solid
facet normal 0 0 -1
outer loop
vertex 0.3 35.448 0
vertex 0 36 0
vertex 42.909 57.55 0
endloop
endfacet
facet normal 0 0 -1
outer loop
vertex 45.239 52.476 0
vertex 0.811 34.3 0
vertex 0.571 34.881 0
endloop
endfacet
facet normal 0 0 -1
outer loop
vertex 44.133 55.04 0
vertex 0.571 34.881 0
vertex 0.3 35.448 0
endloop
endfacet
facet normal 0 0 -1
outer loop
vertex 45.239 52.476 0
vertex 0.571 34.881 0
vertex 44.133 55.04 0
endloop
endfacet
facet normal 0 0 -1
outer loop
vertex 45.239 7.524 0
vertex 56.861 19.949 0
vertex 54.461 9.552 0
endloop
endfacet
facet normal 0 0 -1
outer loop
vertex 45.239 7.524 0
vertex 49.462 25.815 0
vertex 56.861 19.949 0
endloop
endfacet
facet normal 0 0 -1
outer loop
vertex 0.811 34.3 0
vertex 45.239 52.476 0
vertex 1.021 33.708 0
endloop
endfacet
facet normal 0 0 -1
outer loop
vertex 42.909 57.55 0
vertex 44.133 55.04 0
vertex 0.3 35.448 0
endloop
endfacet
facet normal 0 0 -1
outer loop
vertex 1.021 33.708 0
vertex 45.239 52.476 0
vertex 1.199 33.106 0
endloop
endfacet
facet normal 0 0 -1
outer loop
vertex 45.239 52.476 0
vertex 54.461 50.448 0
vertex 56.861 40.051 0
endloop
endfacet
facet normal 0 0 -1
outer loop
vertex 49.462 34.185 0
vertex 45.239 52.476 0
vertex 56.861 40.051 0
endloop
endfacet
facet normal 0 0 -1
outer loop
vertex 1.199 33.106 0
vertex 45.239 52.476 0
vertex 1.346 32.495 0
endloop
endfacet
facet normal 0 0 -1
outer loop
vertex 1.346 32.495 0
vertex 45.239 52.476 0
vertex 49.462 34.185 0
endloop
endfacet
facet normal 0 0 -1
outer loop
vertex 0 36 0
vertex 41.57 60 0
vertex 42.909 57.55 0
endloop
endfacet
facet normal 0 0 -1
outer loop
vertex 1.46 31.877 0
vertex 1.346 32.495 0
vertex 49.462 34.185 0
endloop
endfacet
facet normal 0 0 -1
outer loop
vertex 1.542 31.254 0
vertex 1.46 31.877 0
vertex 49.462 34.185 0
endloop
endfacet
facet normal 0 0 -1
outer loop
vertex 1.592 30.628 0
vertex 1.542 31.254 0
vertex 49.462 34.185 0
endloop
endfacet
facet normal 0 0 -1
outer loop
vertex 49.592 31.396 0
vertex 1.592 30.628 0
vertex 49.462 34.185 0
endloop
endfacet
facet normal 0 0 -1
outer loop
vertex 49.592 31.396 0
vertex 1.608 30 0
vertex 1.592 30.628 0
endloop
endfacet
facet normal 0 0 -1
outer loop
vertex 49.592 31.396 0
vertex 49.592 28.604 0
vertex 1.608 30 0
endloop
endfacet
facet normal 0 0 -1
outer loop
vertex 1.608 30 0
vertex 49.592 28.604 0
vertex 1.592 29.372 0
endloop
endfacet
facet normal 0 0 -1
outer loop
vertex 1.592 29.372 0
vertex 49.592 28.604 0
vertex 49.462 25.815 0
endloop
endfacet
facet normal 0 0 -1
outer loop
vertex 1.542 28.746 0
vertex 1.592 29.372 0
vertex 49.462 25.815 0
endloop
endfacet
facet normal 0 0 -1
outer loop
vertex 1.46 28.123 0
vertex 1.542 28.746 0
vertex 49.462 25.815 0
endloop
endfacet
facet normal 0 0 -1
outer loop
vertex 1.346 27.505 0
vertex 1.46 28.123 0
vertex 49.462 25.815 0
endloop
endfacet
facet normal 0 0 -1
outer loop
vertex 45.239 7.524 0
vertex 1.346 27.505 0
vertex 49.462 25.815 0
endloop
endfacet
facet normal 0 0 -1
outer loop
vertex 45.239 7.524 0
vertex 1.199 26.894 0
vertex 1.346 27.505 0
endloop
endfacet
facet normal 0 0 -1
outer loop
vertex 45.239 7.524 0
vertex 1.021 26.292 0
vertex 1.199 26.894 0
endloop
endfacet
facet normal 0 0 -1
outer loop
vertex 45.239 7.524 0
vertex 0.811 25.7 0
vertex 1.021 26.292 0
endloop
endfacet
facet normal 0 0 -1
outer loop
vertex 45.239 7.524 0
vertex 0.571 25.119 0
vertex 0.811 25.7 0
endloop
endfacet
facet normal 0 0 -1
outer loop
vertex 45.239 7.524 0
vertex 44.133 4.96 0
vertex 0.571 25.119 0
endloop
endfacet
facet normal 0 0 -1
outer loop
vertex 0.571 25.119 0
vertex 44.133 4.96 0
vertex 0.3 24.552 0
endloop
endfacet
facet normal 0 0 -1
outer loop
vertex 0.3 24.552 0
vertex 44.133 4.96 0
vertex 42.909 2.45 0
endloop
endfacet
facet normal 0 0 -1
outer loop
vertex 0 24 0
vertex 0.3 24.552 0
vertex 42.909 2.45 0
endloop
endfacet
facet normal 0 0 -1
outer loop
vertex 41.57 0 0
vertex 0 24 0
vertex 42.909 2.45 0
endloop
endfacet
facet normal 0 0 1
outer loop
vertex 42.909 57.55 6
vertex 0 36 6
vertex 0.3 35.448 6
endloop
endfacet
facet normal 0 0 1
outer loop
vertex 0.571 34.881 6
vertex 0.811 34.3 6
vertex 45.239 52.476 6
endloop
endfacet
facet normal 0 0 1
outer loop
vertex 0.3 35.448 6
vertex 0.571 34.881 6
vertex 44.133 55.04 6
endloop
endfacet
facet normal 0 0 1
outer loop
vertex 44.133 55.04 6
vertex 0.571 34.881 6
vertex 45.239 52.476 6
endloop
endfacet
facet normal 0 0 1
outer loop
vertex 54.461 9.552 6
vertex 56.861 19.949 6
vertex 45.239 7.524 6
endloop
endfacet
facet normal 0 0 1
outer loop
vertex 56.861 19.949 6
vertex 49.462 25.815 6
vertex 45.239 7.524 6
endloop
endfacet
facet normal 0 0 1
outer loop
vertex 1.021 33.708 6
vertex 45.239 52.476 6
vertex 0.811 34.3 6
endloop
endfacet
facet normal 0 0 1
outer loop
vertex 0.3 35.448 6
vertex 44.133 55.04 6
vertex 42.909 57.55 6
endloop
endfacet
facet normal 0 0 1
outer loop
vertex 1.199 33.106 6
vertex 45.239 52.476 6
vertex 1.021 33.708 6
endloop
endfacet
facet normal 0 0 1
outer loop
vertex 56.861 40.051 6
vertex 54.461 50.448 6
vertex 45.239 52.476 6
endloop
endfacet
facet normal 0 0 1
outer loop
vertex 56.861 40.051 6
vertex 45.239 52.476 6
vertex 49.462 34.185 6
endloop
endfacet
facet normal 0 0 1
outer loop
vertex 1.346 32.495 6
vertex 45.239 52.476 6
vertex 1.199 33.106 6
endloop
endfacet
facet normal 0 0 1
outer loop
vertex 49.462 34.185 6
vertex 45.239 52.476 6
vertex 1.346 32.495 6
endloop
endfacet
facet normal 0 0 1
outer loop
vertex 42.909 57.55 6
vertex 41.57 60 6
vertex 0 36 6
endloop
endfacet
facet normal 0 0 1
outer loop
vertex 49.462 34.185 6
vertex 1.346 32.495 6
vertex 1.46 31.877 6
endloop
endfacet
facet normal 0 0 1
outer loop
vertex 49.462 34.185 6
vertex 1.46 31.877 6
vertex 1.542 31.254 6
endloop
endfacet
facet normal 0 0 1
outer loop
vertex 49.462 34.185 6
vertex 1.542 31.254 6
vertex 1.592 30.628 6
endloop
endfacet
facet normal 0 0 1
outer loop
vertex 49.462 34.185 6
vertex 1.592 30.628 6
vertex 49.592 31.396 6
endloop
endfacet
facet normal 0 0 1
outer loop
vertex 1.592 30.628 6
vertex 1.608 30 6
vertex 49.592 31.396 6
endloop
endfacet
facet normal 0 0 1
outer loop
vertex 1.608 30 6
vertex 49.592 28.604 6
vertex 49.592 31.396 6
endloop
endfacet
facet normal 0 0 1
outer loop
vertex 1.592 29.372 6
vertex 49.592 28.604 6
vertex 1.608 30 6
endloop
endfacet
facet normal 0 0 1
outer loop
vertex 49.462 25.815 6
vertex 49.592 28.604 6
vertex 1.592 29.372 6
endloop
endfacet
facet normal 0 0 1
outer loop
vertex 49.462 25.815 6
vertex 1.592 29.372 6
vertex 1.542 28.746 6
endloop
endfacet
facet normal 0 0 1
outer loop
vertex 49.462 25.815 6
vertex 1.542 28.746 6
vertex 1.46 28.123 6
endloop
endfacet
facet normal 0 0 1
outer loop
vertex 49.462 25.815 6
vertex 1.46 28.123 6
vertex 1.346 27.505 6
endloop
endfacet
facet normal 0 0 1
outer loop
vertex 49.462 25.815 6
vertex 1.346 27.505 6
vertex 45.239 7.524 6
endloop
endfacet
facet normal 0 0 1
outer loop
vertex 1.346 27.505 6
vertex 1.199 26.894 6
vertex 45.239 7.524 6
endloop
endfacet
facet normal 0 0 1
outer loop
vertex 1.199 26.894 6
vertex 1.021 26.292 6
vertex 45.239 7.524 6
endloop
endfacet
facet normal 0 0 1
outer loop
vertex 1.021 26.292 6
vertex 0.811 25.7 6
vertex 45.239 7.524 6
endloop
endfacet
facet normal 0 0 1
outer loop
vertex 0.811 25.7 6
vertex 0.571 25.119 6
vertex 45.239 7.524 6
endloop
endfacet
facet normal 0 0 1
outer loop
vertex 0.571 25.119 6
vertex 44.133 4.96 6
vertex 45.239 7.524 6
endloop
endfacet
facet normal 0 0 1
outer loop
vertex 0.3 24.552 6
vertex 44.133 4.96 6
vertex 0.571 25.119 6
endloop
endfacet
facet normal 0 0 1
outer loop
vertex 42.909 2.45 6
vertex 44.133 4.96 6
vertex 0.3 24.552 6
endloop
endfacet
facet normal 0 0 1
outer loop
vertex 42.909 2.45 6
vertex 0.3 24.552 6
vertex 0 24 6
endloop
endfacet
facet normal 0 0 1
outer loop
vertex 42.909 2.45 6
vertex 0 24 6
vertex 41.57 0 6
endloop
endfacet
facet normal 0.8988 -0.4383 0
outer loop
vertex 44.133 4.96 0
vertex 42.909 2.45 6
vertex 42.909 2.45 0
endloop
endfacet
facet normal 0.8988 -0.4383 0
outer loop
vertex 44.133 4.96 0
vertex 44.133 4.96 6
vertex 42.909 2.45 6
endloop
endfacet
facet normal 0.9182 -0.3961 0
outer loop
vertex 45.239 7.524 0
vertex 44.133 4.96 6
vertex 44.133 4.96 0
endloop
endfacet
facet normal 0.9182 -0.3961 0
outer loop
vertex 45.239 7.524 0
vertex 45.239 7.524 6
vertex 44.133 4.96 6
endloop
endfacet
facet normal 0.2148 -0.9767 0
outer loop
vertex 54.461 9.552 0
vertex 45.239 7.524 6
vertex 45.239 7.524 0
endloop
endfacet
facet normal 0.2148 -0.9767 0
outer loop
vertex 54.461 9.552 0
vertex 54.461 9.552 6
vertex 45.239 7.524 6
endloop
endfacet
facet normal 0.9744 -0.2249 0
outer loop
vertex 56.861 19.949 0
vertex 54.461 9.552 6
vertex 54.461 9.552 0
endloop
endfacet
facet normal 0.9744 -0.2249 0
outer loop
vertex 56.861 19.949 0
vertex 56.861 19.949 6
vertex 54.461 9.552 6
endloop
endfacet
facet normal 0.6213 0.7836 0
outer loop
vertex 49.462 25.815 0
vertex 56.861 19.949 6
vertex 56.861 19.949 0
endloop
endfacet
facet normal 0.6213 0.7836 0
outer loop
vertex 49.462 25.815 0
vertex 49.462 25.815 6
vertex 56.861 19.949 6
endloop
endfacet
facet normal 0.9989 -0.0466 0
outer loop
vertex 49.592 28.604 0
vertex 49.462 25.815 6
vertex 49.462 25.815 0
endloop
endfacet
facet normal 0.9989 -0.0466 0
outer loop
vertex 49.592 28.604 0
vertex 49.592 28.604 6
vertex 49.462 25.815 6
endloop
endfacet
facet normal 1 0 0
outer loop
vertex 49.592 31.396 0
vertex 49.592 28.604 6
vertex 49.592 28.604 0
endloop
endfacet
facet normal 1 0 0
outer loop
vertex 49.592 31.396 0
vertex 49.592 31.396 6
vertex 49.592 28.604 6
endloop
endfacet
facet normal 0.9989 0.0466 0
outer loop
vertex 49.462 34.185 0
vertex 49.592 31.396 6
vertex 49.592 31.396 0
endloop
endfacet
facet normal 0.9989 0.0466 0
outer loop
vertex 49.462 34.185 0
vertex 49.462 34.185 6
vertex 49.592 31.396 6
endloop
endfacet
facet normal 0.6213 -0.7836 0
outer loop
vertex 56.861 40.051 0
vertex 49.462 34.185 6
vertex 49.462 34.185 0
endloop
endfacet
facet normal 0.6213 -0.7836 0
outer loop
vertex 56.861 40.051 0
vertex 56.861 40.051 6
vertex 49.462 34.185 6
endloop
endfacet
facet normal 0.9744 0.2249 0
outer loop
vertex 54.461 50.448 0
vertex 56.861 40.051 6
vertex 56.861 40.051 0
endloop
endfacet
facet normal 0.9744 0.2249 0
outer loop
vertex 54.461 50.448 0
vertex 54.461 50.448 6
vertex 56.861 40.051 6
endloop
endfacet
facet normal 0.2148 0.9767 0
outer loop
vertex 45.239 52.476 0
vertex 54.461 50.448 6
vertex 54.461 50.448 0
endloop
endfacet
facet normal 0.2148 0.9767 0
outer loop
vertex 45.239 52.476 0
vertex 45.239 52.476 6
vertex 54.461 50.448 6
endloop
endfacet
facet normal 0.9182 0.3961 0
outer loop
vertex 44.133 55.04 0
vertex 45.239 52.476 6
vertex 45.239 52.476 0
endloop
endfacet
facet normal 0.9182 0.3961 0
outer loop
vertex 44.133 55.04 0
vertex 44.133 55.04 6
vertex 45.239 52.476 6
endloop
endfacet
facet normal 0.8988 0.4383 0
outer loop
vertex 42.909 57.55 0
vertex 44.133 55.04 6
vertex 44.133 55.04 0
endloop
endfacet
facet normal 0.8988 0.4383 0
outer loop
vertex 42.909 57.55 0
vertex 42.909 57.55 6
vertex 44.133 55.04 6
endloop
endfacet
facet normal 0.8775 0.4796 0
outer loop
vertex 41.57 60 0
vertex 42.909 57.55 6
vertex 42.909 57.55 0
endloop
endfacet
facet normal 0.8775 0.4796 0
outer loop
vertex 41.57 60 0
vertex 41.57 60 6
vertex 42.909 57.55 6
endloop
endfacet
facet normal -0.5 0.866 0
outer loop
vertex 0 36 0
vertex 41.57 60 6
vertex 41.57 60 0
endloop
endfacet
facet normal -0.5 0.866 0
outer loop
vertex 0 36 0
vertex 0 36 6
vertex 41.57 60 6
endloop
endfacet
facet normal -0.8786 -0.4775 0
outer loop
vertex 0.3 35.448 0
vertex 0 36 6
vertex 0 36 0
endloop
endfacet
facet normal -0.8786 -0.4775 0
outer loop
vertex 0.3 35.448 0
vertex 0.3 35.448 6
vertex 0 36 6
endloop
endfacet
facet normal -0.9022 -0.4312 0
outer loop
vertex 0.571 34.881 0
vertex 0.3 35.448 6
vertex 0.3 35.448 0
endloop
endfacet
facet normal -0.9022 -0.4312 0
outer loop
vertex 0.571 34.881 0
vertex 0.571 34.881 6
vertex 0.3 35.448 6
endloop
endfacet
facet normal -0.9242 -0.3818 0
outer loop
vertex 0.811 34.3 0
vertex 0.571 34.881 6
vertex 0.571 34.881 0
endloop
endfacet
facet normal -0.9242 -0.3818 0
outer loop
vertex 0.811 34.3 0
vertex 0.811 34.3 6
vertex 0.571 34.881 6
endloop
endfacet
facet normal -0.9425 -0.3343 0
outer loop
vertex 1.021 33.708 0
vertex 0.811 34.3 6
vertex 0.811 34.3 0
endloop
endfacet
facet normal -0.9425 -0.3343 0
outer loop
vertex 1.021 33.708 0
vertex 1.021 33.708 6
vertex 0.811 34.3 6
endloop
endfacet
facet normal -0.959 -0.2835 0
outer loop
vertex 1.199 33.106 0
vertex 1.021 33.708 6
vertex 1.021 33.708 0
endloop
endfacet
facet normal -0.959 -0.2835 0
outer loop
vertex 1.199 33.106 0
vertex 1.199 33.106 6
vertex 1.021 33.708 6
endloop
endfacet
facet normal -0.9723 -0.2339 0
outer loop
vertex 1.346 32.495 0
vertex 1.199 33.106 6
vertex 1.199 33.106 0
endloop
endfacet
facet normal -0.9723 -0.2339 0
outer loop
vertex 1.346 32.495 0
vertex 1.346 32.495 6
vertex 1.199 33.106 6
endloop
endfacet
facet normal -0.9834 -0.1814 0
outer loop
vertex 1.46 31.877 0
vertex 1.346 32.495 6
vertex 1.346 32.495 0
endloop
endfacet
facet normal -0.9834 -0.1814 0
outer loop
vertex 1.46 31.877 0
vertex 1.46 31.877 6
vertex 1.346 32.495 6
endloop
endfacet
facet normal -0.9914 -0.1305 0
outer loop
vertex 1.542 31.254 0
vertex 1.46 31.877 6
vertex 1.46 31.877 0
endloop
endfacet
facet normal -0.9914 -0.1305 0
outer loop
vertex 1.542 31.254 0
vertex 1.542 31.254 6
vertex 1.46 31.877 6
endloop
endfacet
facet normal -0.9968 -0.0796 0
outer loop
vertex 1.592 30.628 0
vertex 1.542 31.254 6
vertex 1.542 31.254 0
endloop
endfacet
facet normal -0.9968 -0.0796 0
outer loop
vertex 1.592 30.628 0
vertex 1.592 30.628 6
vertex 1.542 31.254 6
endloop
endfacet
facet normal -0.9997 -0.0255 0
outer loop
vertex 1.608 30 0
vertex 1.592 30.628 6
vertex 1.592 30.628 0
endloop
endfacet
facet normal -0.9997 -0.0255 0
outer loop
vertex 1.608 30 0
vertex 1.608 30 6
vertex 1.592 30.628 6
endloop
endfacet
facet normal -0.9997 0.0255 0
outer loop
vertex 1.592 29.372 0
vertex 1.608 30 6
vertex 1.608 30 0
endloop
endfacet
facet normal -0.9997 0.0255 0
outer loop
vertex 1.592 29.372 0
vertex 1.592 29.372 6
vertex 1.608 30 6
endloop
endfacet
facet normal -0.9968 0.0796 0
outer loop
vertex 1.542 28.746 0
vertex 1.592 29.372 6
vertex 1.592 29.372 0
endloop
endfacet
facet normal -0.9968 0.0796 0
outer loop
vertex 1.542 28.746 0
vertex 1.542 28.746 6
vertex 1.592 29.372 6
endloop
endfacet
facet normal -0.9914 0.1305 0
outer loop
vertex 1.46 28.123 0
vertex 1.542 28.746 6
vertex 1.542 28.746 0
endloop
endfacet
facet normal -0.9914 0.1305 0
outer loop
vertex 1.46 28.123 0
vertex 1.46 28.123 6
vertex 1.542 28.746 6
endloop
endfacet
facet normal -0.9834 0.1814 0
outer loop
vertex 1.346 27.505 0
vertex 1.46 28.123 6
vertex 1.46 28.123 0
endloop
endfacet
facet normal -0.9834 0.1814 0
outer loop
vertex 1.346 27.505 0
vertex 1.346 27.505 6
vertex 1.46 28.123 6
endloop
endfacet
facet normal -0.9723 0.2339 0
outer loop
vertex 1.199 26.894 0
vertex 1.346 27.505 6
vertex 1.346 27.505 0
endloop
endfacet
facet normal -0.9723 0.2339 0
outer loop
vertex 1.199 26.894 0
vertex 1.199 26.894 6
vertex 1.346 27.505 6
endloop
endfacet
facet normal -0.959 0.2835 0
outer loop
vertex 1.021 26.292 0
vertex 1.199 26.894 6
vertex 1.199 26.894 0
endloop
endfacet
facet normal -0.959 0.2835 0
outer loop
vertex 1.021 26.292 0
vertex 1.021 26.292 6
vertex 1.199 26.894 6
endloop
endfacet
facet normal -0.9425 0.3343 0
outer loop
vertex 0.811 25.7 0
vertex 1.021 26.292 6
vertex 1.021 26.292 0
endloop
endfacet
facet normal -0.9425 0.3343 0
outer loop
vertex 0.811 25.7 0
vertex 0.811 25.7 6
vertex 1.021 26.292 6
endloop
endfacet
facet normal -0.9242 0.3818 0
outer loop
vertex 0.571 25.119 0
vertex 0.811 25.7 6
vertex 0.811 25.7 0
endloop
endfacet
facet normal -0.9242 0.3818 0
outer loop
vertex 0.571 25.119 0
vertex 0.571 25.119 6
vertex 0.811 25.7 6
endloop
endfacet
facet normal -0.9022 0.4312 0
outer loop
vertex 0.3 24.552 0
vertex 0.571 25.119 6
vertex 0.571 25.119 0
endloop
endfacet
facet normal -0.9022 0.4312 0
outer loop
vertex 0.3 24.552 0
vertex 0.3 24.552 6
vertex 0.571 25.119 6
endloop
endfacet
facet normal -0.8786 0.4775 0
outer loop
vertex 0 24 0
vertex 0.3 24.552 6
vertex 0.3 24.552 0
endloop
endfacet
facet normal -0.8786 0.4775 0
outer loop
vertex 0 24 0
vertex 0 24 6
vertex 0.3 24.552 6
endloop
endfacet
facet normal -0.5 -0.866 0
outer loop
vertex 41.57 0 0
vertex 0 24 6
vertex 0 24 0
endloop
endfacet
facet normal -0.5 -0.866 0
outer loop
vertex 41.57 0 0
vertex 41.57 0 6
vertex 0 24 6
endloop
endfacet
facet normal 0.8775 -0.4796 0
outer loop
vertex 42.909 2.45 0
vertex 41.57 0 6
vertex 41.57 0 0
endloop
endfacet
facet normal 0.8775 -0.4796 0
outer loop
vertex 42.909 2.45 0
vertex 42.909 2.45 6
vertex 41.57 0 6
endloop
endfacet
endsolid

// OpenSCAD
$fn = 32;

// ----------------------------------------------------------------------
// Gear sector: 2 teeth on 60 degrees
// ----------------------------------------------------------------------

// --- parameters (mm) ---
sector_angle = 60;        // sector angle, degrees
root_r = 60;              // root circle radius
tooth_h = 8;              // tooth height over the root circle
teeth = 2;                // number of teeth on the sector
hub_r = 12;               // hub bore radius
plate_t = 6;              // sector thickness, Z
arc_step = 3;             // sampling step of the root/hub arcs, degrees

tip_r = root_r + tooth_h;  // tip circle radius

profile = [[41.57, 0], [42.909, 2.45], [44.133, 4.96], [45.239, 7.524], [54.461, 9.552], [56.861, 19.949], [49.462, 25.815], [49.592, 28.604], [49.592, 31.396], [49.462, 34.185], [56.861, 40.051], [54.461, 50.448], [45.239, 52.476], [44.133, 55.04], [42.909, 57.55], [41.57, 60], [0, 36], [0.3, 35.448], [0.571, 34.881], [0.811, 34.3], [1.021, 33.708], [1.199, 33.106], [1.346, 32.495], [1.46, 31.877], [1.542, 31.254], [1.592, 30.628], [1.608, 30], [1.592, 29.372], [1.542, 28.746], [1.46, 28.123], [1.346, 27.505], [1.199, 26.894], [1.021, 26.292], [0.811, 25.7], [0.571, 25.119], [0.3, 24.552], [0, 24]];  // primary outline, 37 points, counter clockwise

// --- the one profile operation ---
linear_extrude(height = plate_t) polygon(points = profile);
